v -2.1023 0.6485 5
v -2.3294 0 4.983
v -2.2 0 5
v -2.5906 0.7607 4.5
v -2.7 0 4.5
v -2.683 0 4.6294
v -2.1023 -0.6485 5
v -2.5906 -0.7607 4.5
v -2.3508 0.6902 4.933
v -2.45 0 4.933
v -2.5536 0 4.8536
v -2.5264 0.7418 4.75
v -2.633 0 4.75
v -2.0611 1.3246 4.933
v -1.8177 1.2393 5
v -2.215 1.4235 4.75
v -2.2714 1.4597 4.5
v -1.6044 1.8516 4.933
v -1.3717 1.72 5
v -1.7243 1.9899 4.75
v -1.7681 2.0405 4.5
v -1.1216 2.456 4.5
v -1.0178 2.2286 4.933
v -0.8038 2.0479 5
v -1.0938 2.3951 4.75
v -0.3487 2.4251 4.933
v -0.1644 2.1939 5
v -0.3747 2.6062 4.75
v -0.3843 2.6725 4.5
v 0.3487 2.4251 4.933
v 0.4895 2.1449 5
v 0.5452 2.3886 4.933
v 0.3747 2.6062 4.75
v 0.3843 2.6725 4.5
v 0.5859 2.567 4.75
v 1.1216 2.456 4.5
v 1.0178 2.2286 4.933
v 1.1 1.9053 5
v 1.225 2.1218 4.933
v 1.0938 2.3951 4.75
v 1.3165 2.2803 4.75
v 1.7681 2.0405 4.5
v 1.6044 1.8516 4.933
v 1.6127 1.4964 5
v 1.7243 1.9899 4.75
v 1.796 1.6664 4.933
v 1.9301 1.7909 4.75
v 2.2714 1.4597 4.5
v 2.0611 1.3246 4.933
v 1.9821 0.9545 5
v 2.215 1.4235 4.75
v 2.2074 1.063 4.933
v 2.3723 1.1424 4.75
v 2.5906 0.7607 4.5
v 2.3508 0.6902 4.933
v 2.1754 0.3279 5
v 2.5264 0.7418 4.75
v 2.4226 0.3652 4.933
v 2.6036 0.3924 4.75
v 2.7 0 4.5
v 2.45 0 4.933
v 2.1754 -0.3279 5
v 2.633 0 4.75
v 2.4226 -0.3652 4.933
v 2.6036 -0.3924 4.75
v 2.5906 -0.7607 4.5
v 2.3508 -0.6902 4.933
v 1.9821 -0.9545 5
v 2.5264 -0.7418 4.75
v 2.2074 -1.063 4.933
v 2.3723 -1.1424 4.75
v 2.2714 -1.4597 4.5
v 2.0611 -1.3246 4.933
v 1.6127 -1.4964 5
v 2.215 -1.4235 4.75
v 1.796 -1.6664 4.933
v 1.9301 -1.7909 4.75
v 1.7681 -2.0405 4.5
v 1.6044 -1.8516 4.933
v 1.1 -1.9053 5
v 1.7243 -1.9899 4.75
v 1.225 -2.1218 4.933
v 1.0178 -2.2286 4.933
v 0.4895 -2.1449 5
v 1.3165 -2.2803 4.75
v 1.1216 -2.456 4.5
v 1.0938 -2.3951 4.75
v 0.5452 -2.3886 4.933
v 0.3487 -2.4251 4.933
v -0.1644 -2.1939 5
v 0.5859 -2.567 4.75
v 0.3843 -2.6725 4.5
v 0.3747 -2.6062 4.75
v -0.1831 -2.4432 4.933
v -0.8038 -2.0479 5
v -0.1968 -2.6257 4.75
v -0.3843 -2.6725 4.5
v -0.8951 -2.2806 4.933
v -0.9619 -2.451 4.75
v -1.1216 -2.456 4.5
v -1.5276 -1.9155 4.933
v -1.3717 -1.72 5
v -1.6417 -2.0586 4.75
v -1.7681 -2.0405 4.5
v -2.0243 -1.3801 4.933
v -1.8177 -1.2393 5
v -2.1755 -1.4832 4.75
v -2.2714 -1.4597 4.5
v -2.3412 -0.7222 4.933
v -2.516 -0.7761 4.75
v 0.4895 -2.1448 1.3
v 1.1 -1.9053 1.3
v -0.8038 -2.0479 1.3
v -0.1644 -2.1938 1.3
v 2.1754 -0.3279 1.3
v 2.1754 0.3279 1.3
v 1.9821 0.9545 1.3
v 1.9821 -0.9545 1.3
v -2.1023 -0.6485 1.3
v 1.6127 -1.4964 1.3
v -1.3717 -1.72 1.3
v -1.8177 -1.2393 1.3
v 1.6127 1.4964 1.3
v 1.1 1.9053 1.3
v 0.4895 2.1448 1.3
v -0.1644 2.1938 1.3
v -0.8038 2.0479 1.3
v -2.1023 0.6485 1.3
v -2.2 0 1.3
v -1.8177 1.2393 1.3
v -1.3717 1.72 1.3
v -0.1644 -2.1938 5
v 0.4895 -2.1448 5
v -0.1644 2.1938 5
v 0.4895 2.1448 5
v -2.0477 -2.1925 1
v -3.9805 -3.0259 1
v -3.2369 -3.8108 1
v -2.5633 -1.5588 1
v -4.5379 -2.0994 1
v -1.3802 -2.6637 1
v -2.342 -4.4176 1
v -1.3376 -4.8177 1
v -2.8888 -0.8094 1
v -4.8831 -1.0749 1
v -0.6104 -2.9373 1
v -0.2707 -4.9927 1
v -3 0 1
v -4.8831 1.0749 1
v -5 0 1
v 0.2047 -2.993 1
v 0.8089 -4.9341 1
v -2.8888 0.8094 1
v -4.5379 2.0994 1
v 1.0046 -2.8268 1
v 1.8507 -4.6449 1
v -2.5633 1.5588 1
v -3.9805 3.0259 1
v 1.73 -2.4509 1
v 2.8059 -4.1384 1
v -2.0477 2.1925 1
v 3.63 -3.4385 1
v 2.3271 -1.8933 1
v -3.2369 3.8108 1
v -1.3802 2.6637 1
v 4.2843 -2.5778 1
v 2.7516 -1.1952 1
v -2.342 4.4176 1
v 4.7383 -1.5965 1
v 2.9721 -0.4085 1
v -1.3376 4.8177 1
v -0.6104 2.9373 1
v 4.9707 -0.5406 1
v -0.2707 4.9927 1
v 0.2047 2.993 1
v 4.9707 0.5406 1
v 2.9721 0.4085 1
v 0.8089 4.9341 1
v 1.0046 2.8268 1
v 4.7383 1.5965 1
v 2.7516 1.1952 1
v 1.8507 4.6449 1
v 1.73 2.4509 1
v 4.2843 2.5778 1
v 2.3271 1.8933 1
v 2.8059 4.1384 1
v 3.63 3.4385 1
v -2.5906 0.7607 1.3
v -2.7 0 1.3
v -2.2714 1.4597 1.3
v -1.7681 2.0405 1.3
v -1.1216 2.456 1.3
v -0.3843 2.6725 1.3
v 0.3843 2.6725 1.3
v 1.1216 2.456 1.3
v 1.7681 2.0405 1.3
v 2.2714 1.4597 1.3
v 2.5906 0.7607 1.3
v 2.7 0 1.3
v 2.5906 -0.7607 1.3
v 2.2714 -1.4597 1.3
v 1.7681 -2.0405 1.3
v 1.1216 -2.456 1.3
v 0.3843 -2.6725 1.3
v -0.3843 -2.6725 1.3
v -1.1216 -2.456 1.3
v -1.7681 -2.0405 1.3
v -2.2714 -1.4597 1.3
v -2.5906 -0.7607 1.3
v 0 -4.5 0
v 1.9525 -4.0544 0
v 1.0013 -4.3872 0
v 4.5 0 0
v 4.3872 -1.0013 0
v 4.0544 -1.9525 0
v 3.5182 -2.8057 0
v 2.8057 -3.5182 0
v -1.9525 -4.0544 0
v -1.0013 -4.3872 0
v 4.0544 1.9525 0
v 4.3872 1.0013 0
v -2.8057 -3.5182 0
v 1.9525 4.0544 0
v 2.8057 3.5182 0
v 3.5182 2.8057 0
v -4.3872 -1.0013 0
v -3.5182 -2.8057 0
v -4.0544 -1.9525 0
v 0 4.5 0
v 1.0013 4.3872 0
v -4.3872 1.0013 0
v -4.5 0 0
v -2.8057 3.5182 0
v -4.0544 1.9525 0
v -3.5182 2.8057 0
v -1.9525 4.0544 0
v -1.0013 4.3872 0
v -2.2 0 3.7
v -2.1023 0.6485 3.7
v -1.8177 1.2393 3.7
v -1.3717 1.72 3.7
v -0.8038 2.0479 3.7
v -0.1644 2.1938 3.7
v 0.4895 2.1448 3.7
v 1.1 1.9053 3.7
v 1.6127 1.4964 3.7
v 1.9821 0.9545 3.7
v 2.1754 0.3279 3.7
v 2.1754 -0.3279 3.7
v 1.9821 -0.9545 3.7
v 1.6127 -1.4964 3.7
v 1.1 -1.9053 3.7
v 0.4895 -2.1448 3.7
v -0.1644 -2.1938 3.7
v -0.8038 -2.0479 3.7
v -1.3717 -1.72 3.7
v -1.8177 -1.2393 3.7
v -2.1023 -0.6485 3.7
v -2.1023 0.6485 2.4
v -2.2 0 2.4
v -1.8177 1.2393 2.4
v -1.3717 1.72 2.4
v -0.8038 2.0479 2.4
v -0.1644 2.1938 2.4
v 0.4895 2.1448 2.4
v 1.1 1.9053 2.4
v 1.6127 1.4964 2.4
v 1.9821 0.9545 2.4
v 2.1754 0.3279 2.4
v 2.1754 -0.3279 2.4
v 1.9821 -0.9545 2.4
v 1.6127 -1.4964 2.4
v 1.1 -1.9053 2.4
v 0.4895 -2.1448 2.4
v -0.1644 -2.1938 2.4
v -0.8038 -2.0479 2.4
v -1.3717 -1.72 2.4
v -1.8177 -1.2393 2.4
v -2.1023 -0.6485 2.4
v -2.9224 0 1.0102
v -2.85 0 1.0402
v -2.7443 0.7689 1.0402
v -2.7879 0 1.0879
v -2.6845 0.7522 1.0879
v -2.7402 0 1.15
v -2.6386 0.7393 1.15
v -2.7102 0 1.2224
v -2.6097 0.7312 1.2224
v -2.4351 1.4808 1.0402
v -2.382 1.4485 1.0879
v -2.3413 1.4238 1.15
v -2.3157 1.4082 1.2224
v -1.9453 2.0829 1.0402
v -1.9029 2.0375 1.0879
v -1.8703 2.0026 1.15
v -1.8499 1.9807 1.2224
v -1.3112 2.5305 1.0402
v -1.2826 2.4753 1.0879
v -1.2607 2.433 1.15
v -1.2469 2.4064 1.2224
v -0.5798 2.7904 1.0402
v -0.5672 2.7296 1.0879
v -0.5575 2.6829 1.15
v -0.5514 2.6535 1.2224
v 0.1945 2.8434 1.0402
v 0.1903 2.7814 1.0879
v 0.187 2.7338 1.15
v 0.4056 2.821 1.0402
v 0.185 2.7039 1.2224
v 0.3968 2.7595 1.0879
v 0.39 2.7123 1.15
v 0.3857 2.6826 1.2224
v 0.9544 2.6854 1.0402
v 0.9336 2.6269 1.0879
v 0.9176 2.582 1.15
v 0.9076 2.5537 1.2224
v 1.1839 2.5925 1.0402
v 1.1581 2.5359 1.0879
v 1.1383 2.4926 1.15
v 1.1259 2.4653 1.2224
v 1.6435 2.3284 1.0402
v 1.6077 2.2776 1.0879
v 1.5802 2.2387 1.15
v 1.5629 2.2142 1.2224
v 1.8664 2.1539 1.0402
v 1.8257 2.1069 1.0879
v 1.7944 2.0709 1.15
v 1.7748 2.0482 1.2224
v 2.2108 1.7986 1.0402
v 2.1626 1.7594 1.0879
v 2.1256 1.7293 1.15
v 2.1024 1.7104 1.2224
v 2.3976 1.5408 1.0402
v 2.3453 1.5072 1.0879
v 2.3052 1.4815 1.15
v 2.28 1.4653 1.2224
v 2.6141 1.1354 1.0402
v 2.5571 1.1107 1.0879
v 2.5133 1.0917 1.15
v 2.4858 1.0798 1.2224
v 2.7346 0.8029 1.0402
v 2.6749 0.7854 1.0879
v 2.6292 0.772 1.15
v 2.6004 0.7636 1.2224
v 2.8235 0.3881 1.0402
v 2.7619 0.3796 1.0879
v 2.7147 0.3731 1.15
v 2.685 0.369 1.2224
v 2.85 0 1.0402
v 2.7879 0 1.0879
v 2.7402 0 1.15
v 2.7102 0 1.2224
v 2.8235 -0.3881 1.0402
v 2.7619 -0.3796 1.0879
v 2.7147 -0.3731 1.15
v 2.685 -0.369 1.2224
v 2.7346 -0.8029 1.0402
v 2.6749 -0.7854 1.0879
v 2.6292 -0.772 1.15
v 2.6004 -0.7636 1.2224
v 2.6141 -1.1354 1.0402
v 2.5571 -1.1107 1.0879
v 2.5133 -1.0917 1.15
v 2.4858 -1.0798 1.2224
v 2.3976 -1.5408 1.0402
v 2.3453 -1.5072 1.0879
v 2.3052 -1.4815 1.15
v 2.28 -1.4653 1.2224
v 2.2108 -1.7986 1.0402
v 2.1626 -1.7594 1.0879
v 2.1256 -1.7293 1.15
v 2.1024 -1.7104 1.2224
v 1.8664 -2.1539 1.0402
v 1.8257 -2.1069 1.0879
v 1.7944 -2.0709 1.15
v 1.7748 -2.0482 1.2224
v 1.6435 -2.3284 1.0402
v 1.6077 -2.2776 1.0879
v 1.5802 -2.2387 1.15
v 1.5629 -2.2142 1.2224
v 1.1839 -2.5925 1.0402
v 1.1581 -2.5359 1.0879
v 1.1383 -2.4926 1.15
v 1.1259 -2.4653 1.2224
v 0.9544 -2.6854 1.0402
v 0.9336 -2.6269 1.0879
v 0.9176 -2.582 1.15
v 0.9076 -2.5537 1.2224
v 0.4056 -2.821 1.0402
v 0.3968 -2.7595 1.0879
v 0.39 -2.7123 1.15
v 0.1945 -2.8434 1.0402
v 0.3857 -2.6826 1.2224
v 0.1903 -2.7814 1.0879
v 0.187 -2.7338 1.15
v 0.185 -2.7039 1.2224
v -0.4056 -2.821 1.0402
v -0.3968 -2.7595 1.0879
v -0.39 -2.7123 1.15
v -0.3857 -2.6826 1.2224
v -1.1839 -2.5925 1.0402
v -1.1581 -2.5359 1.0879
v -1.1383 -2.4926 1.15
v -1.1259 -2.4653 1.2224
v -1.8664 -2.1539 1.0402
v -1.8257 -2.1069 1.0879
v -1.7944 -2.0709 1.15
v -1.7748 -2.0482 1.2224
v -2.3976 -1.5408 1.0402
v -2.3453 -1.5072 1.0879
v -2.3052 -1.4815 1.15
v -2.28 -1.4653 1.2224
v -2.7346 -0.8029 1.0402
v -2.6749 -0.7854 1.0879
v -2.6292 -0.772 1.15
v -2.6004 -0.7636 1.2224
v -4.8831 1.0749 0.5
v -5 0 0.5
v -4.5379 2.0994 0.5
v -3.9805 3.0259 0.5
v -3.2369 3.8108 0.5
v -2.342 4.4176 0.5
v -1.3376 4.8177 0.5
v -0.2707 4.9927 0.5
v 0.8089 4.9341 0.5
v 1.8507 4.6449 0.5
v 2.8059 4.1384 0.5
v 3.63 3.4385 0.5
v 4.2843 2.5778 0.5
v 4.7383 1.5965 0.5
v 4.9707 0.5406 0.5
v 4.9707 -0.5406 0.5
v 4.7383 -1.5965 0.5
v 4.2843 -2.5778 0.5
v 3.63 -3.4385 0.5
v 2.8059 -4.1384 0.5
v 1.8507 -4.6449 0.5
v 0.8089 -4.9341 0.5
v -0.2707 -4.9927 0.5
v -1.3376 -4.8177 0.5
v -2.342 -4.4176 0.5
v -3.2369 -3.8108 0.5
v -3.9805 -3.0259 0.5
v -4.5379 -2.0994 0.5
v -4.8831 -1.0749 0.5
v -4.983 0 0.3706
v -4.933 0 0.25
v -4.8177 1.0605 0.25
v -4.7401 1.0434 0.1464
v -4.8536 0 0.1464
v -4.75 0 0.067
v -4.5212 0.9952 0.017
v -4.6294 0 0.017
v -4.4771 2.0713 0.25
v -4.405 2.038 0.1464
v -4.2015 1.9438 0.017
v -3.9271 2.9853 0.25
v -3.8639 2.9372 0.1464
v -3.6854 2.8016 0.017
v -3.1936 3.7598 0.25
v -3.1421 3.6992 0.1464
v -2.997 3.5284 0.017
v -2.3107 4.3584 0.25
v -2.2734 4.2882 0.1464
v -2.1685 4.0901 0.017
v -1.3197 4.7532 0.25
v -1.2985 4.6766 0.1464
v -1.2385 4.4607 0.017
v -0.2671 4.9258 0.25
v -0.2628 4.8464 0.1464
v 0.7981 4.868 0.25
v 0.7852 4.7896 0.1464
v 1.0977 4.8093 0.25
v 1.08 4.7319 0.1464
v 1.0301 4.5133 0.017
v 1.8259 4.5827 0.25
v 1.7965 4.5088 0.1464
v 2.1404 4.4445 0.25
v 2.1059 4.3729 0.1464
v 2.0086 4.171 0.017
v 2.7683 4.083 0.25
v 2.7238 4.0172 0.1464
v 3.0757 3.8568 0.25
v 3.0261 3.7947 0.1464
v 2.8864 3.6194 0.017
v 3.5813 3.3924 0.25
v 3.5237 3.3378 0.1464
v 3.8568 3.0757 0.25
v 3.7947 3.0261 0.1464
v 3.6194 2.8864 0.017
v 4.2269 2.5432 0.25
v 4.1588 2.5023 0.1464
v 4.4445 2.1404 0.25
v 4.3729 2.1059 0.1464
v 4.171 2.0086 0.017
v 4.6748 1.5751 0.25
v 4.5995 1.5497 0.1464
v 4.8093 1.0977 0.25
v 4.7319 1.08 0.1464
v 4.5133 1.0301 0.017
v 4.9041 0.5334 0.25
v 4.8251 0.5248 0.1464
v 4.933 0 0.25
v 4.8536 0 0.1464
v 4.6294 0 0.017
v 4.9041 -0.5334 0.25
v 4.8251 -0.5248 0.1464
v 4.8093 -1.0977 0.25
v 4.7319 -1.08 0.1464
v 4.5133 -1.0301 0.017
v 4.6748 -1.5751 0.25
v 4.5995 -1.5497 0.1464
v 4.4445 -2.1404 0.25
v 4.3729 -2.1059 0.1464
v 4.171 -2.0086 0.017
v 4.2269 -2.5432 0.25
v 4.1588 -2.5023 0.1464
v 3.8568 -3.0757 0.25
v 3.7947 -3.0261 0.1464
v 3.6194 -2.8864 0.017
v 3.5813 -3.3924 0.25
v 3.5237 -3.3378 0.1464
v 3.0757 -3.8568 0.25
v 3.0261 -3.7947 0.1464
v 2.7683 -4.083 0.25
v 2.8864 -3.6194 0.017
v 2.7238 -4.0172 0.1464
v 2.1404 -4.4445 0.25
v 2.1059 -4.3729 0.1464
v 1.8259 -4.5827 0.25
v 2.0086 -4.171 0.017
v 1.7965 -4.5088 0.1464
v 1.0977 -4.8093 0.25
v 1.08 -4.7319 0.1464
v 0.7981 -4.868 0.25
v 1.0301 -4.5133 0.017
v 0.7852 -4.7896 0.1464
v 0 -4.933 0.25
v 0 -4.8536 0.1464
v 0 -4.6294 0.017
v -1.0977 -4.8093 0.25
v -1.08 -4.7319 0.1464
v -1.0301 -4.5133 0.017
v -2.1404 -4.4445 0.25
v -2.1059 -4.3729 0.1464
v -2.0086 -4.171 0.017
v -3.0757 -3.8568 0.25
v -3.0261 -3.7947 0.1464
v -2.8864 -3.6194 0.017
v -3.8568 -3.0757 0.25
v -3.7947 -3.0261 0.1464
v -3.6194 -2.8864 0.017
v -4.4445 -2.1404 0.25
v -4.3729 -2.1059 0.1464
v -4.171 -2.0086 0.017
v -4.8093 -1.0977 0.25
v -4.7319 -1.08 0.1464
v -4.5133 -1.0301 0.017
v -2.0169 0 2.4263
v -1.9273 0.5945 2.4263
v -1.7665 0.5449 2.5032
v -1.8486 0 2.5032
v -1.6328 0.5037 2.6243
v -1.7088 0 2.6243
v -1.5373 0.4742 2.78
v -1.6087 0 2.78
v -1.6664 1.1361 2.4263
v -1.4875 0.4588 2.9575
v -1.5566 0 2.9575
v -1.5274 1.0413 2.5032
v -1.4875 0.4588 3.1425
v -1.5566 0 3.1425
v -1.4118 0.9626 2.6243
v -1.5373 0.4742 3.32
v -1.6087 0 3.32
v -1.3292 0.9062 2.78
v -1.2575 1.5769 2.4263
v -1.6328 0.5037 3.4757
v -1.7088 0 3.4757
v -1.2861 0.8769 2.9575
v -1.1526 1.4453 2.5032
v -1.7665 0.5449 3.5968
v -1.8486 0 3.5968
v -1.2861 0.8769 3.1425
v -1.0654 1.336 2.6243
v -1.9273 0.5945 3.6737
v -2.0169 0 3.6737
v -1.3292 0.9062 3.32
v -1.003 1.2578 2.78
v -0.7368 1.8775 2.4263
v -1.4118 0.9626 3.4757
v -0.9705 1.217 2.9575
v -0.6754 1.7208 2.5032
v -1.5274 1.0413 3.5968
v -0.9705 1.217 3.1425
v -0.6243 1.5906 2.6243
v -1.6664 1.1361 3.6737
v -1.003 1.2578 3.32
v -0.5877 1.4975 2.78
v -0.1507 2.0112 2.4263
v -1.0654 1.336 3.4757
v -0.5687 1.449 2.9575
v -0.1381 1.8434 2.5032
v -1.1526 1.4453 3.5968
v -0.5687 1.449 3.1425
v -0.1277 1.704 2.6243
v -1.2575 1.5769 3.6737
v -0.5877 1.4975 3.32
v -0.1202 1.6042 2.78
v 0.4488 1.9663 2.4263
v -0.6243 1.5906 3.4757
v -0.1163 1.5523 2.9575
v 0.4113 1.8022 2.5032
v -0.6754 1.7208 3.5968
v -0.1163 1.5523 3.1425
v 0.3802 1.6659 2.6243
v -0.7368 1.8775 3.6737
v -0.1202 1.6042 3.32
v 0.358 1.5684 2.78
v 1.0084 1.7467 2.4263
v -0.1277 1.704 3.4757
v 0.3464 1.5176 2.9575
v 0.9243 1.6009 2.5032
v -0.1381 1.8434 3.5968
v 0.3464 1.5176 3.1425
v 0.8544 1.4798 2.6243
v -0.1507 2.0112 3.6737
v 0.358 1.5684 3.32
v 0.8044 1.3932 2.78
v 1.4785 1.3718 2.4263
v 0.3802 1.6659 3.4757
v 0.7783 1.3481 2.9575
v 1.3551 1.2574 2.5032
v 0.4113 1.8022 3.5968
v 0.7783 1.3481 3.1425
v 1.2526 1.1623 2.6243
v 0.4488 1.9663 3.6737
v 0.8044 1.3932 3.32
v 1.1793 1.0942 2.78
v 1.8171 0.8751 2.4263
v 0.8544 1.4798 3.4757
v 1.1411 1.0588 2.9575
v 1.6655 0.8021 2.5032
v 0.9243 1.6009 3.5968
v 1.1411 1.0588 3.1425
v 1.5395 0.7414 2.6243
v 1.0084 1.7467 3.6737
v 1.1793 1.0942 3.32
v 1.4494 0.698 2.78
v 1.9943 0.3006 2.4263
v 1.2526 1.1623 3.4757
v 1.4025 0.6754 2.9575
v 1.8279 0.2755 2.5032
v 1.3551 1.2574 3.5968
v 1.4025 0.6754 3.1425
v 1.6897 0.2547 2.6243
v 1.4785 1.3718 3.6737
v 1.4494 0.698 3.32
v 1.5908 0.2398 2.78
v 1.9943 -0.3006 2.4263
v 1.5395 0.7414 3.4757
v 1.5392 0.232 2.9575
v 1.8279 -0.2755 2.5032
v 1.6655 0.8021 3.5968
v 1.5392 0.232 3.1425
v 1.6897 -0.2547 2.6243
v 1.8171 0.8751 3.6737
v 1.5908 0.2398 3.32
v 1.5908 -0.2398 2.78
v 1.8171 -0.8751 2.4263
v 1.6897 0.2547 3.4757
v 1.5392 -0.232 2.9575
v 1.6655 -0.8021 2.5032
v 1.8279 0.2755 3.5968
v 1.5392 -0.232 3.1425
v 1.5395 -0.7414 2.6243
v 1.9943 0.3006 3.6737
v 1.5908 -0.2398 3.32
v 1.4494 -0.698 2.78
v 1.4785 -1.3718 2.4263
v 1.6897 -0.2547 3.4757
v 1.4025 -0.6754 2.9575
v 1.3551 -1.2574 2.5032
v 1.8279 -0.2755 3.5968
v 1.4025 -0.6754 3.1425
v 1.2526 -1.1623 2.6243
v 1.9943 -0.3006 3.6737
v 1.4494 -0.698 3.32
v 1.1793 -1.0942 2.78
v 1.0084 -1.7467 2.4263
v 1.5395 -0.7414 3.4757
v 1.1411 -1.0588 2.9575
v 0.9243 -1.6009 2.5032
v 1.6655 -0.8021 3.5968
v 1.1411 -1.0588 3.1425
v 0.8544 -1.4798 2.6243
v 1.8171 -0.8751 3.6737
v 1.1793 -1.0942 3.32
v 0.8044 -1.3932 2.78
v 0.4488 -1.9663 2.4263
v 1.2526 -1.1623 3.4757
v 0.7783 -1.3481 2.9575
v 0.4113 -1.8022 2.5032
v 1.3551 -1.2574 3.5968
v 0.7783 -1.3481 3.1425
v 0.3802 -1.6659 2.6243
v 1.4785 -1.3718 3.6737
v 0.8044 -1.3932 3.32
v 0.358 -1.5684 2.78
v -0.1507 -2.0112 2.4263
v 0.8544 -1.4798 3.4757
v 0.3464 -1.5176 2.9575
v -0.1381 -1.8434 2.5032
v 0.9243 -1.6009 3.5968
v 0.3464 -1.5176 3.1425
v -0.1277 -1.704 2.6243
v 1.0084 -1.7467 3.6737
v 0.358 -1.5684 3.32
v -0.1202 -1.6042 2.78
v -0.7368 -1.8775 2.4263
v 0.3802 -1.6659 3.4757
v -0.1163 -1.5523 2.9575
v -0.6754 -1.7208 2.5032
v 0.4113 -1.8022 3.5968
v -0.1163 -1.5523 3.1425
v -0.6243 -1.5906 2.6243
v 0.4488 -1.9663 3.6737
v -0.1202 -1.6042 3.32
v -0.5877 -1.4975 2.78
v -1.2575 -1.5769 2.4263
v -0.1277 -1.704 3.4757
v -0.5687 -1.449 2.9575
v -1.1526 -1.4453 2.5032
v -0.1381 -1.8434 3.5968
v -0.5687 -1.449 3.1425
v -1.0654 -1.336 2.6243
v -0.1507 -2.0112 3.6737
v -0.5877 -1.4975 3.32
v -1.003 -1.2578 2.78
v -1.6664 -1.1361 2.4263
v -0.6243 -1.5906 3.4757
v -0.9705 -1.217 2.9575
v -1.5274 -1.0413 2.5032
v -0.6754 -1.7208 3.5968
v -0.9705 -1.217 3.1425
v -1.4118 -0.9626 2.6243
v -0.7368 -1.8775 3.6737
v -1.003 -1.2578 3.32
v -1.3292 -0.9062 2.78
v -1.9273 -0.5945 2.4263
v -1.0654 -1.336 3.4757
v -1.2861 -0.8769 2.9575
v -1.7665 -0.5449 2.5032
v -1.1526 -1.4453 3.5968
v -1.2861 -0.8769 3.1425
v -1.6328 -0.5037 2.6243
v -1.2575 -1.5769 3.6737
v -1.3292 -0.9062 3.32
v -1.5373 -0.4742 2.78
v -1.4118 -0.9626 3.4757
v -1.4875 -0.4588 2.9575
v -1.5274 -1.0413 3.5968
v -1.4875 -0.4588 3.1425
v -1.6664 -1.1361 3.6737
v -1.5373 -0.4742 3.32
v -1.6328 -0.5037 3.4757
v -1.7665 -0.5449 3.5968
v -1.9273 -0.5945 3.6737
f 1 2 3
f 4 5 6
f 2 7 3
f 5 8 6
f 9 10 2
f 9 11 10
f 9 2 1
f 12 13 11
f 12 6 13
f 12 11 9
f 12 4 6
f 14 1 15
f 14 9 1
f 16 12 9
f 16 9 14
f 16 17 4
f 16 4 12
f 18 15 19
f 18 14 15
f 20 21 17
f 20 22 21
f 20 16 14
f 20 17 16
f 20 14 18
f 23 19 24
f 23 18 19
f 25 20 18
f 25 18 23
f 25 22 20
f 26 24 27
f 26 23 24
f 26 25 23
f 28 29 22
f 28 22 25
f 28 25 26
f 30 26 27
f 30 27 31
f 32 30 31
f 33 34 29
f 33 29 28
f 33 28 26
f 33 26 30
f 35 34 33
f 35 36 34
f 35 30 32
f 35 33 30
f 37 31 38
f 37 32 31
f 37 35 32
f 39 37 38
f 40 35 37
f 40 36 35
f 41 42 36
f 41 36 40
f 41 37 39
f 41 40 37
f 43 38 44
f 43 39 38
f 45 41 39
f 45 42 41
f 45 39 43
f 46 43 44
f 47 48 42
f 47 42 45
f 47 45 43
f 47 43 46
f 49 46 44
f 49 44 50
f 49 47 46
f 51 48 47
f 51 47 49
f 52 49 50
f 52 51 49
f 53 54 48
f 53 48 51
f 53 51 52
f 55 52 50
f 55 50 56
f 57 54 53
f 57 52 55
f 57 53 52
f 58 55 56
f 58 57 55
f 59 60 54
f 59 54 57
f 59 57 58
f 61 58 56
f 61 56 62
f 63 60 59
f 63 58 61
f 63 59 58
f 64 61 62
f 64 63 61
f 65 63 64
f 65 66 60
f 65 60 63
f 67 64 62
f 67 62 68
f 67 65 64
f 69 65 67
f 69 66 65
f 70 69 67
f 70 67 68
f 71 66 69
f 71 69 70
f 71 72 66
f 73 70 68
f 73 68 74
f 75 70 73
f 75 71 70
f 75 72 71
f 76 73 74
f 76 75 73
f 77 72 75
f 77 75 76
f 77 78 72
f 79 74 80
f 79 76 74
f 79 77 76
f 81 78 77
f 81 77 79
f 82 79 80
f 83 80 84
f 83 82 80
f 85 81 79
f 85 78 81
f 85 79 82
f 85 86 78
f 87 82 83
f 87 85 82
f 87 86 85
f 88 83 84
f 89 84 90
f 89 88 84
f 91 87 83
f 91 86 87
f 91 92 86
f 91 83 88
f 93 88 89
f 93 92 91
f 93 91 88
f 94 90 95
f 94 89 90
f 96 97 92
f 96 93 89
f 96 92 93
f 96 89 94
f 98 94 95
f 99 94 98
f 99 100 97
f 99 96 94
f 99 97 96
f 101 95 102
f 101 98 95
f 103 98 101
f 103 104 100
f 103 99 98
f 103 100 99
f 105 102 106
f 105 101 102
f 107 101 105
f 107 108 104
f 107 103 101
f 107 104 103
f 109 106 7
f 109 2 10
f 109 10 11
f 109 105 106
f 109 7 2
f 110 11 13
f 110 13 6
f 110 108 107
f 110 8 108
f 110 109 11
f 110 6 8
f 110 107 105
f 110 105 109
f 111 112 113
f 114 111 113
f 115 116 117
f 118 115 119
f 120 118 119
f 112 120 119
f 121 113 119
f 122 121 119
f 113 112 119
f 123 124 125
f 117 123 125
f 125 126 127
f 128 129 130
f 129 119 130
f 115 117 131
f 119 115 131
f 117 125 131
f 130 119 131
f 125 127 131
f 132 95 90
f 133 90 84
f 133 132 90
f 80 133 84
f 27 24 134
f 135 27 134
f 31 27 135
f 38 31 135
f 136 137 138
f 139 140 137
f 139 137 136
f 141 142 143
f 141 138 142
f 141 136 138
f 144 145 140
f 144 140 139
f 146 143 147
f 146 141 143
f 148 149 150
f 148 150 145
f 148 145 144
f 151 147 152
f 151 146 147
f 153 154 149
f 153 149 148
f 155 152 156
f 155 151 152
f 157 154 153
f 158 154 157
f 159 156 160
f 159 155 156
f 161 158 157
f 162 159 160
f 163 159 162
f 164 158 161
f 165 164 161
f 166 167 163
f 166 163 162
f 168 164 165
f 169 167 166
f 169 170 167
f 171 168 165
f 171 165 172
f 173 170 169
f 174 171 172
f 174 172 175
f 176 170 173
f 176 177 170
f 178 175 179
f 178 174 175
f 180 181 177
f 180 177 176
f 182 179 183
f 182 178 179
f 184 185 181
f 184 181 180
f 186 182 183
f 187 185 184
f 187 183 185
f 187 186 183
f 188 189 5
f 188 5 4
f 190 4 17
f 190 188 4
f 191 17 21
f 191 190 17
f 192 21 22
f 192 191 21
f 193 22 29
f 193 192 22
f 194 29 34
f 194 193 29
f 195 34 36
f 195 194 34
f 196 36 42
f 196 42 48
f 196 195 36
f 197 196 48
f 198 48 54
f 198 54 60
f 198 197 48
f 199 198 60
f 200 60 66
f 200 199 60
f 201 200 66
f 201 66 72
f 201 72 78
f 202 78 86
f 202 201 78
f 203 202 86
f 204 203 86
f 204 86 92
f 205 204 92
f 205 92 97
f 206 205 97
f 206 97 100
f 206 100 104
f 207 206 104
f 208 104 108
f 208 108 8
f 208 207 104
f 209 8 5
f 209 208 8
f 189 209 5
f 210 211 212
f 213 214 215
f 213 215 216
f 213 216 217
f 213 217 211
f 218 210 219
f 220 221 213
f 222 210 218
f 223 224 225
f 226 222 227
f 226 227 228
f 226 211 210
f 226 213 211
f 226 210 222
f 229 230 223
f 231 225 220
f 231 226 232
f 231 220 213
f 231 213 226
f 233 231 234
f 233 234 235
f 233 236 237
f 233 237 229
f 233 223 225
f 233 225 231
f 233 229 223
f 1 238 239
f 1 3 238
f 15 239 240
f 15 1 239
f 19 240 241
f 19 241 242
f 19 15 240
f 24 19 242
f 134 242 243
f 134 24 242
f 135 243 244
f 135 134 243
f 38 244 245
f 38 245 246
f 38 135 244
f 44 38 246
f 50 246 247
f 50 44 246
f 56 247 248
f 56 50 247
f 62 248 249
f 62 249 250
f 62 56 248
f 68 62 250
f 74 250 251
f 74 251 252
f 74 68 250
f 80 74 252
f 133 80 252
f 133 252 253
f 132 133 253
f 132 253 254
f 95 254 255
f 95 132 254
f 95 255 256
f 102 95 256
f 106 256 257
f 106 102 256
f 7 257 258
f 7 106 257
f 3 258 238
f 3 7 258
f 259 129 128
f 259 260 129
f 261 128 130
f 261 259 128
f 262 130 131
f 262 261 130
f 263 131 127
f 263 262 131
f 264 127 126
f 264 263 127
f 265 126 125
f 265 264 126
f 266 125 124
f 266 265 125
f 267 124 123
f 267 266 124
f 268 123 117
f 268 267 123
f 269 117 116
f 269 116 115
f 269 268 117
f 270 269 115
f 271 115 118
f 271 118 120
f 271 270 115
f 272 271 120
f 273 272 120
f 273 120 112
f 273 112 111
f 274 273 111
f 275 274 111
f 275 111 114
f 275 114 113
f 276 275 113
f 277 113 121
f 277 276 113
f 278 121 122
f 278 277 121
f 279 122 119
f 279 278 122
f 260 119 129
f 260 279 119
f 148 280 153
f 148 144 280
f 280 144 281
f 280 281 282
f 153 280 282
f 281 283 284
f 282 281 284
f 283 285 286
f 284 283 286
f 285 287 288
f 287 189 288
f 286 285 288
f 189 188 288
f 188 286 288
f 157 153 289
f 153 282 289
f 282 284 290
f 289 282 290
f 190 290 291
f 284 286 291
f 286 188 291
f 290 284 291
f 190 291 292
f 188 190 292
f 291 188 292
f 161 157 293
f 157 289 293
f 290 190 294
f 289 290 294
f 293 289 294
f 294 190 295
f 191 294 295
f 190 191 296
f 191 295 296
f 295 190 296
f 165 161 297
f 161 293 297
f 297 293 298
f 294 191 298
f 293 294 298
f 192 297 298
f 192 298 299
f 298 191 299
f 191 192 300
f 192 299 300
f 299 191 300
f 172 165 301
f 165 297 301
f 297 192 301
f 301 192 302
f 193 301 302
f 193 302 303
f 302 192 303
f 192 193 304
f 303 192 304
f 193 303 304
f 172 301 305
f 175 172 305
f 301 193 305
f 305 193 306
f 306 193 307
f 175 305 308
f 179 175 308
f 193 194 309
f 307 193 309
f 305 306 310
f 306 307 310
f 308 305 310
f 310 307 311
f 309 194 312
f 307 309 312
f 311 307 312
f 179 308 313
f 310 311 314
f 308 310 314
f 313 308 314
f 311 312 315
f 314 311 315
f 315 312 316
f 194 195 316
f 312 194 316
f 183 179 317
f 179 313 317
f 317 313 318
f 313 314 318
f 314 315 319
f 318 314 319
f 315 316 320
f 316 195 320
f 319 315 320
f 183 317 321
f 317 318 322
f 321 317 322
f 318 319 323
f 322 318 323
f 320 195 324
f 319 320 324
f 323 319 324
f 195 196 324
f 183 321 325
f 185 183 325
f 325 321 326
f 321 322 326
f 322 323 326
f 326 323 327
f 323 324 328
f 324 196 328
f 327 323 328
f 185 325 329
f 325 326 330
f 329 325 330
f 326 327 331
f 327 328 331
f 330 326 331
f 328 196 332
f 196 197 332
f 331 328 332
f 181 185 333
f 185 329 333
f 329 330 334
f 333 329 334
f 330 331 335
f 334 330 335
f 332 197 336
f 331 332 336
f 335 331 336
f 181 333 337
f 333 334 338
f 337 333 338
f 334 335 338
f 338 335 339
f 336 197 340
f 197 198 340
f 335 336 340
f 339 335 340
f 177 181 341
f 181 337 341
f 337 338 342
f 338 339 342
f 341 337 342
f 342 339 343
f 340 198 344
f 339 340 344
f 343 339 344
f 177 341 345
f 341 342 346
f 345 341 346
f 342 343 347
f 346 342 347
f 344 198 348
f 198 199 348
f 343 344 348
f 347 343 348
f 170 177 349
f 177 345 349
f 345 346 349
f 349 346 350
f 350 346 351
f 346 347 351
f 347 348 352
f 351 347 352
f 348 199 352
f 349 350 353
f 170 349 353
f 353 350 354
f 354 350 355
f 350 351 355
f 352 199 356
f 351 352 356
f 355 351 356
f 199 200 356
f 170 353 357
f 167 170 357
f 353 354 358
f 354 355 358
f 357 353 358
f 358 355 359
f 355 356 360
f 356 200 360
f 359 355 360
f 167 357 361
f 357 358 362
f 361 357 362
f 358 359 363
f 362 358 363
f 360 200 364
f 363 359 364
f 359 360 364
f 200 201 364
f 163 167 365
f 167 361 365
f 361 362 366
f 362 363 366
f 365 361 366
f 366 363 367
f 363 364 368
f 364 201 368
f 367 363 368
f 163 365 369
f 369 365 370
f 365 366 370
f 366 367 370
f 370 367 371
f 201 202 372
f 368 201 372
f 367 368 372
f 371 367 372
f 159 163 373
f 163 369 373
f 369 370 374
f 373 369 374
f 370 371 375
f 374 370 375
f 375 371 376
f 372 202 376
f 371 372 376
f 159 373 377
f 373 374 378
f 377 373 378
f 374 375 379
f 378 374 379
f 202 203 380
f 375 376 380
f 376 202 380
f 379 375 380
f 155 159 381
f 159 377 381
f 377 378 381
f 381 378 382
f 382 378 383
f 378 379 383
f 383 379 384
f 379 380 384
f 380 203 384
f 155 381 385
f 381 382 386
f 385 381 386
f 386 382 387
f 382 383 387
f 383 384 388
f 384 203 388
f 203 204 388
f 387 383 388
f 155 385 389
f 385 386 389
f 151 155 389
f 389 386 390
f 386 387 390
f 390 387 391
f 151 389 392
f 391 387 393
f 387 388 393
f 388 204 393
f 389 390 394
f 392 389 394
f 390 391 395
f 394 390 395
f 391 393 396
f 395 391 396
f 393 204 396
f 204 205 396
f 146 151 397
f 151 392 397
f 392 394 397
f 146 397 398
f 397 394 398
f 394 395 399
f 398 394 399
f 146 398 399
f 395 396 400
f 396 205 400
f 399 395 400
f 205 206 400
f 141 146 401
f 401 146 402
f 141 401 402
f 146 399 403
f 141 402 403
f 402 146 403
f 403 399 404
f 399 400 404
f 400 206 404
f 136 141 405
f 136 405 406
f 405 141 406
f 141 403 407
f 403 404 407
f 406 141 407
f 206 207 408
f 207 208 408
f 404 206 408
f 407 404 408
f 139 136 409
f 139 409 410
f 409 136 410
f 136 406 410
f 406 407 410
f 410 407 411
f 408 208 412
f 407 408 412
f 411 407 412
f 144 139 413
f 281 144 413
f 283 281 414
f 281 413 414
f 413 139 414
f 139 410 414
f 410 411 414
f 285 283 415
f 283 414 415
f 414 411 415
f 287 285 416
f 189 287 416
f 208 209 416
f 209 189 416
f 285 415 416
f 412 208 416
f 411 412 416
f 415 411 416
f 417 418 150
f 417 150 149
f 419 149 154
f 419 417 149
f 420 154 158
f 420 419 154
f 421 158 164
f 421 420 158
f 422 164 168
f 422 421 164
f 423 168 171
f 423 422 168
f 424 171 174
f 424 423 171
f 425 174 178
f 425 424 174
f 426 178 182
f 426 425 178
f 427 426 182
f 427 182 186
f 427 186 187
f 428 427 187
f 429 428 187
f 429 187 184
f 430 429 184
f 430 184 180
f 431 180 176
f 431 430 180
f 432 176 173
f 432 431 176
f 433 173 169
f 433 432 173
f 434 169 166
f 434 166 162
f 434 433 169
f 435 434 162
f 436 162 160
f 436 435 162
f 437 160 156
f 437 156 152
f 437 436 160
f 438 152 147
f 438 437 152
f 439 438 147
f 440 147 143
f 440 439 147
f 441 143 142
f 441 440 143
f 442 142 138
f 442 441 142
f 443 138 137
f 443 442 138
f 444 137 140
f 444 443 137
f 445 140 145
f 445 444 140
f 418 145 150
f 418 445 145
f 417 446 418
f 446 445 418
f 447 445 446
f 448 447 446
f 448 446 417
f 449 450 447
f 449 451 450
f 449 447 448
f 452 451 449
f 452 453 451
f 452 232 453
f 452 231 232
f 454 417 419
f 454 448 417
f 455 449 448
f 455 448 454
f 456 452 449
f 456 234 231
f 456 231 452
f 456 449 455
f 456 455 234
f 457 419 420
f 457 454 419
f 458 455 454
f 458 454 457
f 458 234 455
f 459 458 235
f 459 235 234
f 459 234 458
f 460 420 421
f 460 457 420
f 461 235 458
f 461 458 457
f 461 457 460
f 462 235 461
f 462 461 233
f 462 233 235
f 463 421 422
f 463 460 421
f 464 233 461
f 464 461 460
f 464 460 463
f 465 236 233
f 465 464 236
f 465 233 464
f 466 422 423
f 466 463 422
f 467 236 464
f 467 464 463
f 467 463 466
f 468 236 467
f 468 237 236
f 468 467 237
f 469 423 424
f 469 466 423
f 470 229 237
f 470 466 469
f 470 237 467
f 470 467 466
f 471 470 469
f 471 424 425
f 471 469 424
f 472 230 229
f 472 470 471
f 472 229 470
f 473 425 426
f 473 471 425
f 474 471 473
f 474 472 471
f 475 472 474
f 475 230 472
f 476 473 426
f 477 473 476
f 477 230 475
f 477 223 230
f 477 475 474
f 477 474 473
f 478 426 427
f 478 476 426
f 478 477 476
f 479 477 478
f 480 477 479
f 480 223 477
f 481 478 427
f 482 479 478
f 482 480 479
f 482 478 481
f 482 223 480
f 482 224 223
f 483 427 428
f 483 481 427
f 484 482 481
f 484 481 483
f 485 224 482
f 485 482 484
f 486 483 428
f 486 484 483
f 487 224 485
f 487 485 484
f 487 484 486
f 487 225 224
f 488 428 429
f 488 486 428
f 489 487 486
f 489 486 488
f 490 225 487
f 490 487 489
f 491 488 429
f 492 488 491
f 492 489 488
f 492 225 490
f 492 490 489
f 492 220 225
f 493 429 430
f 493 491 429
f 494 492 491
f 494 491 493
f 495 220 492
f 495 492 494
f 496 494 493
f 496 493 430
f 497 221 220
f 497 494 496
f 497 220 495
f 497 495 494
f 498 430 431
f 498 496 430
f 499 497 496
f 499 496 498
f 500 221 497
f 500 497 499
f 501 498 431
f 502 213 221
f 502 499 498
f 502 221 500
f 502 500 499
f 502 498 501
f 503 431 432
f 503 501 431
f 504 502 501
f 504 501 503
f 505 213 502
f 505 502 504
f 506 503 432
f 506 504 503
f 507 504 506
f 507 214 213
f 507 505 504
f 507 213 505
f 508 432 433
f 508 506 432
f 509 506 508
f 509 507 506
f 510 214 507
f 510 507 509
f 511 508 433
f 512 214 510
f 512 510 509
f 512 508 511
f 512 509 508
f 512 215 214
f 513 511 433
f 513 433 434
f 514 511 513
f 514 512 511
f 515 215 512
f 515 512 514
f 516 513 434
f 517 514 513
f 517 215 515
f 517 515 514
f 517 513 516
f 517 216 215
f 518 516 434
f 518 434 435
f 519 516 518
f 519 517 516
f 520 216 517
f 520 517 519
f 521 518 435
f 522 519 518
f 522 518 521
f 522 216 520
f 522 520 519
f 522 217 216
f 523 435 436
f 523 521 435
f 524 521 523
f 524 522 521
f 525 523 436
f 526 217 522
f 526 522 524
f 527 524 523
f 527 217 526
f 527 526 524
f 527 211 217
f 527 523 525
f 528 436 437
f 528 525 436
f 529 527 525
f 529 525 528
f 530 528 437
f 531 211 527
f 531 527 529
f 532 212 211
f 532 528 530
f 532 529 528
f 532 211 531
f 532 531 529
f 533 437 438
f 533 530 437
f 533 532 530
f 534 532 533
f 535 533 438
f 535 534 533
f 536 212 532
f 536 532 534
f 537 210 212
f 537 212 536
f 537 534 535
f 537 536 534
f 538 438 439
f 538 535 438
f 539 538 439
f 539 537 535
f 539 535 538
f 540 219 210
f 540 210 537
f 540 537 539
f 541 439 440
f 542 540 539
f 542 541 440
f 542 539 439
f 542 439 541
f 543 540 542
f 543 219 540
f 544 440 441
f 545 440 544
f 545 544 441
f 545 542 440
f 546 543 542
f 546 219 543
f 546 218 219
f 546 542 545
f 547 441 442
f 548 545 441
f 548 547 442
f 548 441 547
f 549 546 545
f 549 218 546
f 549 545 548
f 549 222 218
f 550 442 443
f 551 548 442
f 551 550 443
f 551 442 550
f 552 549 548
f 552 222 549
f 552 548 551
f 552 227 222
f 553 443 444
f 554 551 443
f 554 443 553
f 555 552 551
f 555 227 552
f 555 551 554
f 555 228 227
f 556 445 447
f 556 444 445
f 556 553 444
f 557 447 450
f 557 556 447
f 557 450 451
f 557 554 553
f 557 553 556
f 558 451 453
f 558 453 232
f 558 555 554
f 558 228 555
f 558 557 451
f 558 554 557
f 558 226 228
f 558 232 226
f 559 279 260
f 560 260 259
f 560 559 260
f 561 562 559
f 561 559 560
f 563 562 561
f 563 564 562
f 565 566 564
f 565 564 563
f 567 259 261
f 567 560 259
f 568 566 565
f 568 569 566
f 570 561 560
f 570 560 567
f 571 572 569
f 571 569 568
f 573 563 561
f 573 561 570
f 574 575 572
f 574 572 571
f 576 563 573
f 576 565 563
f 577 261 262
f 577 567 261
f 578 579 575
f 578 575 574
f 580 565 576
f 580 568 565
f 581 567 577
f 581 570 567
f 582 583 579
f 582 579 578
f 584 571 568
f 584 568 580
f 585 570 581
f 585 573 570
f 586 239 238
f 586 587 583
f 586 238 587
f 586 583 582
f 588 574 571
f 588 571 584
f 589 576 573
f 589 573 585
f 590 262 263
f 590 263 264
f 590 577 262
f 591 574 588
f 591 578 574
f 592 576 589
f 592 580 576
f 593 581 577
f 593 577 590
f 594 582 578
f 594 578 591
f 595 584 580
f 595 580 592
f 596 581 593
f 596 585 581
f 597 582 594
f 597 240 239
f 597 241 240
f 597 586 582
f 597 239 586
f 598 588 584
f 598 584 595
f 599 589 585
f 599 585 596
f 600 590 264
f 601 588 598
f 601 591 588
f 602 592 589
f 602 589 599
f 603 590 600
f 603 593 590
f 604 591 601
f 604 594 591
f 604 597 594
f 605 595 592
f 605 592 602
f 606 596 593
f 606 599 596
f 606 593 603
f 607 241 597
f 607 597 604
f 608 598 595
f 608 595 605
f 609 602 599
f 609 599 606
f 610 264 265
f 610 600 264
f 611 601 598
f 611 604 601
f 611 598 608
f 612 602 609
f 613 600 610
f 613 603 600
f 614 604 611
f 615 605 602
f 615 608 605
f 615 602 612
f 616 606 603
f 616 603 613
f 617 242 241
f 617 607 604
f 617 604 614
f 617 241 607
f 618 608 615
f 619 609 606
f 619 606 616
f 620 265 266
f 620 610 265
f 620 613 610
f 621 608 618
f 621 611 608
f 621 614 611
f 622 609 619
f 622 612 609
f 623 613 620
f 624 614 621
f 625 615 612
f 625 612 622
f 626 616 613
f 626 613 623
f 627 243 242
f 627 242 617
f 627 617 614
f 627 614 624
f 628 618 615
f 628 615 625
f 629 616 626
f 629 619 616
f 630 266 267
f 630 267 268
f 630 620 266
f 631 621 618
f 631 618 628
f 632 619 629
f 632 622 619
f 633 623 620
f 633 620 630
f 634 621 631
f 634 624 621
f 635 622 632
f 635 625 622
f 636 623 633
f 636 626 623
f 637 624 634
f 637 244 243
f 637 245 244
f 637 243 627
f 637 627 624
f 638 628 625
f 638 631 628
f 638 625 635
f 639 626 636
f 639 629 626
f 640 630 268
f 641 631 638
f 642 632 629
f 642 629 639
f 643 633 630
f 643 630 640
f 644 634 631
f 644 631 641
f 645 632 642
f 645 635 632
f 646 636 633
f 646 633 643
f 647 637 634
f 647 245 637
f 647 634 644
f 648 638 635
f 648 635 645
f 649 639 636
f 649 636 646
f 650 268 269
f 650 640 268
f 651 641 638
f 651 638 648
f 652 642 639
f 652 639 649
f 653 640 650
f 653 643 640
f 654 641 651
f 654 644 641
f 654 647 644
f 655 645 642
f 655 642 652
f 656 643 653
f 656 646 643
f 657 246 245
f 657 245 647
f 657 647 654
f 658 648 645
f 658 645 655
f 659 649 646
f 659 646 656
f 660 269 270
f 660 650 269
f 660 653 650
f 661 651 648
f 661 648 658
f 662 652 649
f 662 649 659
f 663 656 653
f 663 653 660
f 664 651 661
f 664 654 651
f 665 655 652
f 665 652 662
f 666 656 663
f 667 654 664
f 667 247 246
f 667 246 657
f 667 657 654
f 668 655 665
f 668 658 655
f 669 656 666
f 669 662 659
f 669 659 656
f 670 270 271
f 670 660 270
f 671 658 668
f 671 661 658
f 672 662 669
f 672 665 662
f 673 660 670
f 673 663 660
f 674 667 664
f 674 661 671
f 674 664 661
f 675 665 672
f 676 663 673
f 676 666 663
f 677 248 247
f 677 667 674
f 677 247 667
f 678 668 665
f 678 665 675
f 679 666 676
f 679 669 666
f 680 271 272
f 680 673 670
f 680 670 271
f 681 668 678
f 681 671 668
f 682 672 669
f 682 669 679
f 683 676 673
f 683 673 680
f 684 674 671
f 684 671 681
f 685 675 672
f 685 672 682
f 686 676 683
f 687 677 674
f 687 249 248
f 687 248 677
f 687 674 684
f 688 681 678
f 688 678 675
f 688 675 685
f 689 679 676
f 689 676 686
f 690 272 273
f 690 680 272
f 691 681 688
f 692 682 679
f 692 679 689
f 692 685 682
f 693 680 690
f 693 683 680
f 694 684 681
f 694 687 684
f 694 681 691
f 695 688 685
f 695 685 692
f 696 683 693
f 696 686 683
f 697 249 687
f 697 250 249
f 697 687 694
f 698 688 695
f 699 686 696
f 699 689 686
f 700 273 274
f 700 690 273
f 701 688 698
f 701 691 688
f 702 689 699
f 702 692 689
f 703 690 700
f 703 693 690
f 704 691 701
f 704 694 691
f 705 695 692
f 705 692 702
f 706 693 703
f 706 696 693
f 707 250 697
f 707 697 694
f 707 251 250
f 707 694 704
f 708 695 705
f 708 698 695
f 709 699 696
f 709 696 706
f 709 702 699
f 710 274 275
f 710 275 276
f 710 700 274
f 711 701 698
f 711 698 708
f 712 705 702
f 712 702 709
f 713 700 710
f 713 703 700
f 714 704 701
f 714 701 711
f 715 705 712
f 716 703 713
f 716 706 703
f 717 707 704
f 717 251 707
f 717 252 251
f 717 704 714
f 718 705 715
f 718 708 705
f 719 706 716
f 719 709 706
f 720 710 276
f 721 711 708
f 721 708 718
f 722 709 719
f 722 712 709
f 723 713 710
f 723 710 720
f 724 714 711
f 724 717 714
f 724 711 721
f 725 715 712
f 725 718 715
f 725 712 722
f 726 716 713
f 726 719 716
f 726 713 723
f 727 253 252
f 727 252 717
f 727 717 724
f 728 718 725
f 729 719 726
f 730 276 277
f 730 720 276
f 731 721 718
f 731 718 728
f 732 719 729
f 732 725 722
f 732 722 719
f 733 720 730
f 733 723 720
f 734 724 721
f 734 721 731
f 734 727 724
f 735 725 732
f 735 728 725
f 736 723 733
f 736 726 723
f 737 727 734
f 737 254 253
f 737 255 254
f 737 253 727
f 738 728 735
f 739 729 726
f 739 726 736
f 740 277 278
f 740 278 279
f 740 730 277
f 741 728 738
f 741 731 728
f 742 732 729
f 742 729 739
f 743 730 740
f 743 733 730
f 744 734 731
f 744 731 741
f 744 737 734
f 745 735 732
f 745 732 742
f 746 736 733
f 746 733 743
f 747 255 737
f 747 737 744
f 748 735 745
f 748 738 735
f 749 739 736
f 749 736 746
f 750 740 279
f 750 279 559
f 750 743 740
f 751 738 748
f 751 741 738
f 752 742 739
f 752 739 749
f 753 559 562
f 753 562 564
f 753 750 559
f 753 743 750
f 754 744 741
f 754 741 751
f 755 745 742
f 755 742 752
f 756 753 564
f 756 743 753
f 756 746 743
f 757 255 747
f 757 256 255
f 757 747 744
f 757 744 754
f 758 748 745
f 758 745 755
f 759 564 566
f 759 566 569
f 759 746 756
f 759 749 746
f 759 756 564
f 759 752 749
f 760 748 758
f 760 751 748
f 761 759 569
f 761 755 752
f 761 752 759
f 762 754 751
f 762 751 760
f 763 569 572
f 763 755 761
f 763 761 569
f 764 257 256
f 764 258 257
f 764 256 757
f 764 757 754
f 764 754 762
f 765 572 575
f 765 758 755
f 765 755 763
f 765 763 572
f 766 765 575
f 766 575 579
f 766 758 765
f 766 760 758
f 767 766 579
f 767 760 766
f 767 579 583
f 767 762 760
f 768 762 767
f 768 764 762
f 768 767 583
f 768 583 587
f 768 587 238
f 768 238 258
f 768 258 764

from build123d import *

# Parameters (mm, degrees)
F0_W = 2.2
F0_H = 0.3
F2_R = 0.49999
F3_R = 0.3


# Not quite as in the source:
# - a fillet or chamfer is up to 0.001 mm smaller than in the source, because OpenCascade refuses the exact size


with BuildPart() as f1:
    # F0 (on Front) → F1 (revolve)
    with BuildSketch(Plane.XZ):
        Polygon((-2.7, 1), (-5, 1), (-5, 0), (0, 0), (0, 1), (-2.2, 1), align=None)
        Polygon((-2.7, 5), (-2.7, 1), (-2.2, 1), (-2.2, 1.3), (-2.2, 2.4), (-2.2, 3.7), (-2.2, 5), align=None)
        with BuildLine():
            Line((-2.2, 3.7), (-2.2, 2.4))
            ThreePointArc((-2.2, 2.4), (-1.55, 3.05), (-2.2, 3.7))
        make_face()
        with Locations((-1.1, 1.15)):
            Rectangle(F0_W, F0_H)
    revolve(axis=Axis((0, 0, 0.5), (0, 0, -1)))

    # F2 (radius 0.5 in the source; OpenCascade refuses exactly that, so slightly less here)
    f2_edges = [f1.edges().sort_by_distance(p)[0] for p in [
        (2.7, 0, 5),
        (5, 0, 0),
    ]]
    fillet(f2_edges, radius=F2_R)

    # F3
    f3_edges = [f1.edges().sort_by_distance(p)[0] for p in [
        (2.7, 0, 1),
    ]]
    fillet(f3_edges, radius=F3_R)


solid = f1.part
